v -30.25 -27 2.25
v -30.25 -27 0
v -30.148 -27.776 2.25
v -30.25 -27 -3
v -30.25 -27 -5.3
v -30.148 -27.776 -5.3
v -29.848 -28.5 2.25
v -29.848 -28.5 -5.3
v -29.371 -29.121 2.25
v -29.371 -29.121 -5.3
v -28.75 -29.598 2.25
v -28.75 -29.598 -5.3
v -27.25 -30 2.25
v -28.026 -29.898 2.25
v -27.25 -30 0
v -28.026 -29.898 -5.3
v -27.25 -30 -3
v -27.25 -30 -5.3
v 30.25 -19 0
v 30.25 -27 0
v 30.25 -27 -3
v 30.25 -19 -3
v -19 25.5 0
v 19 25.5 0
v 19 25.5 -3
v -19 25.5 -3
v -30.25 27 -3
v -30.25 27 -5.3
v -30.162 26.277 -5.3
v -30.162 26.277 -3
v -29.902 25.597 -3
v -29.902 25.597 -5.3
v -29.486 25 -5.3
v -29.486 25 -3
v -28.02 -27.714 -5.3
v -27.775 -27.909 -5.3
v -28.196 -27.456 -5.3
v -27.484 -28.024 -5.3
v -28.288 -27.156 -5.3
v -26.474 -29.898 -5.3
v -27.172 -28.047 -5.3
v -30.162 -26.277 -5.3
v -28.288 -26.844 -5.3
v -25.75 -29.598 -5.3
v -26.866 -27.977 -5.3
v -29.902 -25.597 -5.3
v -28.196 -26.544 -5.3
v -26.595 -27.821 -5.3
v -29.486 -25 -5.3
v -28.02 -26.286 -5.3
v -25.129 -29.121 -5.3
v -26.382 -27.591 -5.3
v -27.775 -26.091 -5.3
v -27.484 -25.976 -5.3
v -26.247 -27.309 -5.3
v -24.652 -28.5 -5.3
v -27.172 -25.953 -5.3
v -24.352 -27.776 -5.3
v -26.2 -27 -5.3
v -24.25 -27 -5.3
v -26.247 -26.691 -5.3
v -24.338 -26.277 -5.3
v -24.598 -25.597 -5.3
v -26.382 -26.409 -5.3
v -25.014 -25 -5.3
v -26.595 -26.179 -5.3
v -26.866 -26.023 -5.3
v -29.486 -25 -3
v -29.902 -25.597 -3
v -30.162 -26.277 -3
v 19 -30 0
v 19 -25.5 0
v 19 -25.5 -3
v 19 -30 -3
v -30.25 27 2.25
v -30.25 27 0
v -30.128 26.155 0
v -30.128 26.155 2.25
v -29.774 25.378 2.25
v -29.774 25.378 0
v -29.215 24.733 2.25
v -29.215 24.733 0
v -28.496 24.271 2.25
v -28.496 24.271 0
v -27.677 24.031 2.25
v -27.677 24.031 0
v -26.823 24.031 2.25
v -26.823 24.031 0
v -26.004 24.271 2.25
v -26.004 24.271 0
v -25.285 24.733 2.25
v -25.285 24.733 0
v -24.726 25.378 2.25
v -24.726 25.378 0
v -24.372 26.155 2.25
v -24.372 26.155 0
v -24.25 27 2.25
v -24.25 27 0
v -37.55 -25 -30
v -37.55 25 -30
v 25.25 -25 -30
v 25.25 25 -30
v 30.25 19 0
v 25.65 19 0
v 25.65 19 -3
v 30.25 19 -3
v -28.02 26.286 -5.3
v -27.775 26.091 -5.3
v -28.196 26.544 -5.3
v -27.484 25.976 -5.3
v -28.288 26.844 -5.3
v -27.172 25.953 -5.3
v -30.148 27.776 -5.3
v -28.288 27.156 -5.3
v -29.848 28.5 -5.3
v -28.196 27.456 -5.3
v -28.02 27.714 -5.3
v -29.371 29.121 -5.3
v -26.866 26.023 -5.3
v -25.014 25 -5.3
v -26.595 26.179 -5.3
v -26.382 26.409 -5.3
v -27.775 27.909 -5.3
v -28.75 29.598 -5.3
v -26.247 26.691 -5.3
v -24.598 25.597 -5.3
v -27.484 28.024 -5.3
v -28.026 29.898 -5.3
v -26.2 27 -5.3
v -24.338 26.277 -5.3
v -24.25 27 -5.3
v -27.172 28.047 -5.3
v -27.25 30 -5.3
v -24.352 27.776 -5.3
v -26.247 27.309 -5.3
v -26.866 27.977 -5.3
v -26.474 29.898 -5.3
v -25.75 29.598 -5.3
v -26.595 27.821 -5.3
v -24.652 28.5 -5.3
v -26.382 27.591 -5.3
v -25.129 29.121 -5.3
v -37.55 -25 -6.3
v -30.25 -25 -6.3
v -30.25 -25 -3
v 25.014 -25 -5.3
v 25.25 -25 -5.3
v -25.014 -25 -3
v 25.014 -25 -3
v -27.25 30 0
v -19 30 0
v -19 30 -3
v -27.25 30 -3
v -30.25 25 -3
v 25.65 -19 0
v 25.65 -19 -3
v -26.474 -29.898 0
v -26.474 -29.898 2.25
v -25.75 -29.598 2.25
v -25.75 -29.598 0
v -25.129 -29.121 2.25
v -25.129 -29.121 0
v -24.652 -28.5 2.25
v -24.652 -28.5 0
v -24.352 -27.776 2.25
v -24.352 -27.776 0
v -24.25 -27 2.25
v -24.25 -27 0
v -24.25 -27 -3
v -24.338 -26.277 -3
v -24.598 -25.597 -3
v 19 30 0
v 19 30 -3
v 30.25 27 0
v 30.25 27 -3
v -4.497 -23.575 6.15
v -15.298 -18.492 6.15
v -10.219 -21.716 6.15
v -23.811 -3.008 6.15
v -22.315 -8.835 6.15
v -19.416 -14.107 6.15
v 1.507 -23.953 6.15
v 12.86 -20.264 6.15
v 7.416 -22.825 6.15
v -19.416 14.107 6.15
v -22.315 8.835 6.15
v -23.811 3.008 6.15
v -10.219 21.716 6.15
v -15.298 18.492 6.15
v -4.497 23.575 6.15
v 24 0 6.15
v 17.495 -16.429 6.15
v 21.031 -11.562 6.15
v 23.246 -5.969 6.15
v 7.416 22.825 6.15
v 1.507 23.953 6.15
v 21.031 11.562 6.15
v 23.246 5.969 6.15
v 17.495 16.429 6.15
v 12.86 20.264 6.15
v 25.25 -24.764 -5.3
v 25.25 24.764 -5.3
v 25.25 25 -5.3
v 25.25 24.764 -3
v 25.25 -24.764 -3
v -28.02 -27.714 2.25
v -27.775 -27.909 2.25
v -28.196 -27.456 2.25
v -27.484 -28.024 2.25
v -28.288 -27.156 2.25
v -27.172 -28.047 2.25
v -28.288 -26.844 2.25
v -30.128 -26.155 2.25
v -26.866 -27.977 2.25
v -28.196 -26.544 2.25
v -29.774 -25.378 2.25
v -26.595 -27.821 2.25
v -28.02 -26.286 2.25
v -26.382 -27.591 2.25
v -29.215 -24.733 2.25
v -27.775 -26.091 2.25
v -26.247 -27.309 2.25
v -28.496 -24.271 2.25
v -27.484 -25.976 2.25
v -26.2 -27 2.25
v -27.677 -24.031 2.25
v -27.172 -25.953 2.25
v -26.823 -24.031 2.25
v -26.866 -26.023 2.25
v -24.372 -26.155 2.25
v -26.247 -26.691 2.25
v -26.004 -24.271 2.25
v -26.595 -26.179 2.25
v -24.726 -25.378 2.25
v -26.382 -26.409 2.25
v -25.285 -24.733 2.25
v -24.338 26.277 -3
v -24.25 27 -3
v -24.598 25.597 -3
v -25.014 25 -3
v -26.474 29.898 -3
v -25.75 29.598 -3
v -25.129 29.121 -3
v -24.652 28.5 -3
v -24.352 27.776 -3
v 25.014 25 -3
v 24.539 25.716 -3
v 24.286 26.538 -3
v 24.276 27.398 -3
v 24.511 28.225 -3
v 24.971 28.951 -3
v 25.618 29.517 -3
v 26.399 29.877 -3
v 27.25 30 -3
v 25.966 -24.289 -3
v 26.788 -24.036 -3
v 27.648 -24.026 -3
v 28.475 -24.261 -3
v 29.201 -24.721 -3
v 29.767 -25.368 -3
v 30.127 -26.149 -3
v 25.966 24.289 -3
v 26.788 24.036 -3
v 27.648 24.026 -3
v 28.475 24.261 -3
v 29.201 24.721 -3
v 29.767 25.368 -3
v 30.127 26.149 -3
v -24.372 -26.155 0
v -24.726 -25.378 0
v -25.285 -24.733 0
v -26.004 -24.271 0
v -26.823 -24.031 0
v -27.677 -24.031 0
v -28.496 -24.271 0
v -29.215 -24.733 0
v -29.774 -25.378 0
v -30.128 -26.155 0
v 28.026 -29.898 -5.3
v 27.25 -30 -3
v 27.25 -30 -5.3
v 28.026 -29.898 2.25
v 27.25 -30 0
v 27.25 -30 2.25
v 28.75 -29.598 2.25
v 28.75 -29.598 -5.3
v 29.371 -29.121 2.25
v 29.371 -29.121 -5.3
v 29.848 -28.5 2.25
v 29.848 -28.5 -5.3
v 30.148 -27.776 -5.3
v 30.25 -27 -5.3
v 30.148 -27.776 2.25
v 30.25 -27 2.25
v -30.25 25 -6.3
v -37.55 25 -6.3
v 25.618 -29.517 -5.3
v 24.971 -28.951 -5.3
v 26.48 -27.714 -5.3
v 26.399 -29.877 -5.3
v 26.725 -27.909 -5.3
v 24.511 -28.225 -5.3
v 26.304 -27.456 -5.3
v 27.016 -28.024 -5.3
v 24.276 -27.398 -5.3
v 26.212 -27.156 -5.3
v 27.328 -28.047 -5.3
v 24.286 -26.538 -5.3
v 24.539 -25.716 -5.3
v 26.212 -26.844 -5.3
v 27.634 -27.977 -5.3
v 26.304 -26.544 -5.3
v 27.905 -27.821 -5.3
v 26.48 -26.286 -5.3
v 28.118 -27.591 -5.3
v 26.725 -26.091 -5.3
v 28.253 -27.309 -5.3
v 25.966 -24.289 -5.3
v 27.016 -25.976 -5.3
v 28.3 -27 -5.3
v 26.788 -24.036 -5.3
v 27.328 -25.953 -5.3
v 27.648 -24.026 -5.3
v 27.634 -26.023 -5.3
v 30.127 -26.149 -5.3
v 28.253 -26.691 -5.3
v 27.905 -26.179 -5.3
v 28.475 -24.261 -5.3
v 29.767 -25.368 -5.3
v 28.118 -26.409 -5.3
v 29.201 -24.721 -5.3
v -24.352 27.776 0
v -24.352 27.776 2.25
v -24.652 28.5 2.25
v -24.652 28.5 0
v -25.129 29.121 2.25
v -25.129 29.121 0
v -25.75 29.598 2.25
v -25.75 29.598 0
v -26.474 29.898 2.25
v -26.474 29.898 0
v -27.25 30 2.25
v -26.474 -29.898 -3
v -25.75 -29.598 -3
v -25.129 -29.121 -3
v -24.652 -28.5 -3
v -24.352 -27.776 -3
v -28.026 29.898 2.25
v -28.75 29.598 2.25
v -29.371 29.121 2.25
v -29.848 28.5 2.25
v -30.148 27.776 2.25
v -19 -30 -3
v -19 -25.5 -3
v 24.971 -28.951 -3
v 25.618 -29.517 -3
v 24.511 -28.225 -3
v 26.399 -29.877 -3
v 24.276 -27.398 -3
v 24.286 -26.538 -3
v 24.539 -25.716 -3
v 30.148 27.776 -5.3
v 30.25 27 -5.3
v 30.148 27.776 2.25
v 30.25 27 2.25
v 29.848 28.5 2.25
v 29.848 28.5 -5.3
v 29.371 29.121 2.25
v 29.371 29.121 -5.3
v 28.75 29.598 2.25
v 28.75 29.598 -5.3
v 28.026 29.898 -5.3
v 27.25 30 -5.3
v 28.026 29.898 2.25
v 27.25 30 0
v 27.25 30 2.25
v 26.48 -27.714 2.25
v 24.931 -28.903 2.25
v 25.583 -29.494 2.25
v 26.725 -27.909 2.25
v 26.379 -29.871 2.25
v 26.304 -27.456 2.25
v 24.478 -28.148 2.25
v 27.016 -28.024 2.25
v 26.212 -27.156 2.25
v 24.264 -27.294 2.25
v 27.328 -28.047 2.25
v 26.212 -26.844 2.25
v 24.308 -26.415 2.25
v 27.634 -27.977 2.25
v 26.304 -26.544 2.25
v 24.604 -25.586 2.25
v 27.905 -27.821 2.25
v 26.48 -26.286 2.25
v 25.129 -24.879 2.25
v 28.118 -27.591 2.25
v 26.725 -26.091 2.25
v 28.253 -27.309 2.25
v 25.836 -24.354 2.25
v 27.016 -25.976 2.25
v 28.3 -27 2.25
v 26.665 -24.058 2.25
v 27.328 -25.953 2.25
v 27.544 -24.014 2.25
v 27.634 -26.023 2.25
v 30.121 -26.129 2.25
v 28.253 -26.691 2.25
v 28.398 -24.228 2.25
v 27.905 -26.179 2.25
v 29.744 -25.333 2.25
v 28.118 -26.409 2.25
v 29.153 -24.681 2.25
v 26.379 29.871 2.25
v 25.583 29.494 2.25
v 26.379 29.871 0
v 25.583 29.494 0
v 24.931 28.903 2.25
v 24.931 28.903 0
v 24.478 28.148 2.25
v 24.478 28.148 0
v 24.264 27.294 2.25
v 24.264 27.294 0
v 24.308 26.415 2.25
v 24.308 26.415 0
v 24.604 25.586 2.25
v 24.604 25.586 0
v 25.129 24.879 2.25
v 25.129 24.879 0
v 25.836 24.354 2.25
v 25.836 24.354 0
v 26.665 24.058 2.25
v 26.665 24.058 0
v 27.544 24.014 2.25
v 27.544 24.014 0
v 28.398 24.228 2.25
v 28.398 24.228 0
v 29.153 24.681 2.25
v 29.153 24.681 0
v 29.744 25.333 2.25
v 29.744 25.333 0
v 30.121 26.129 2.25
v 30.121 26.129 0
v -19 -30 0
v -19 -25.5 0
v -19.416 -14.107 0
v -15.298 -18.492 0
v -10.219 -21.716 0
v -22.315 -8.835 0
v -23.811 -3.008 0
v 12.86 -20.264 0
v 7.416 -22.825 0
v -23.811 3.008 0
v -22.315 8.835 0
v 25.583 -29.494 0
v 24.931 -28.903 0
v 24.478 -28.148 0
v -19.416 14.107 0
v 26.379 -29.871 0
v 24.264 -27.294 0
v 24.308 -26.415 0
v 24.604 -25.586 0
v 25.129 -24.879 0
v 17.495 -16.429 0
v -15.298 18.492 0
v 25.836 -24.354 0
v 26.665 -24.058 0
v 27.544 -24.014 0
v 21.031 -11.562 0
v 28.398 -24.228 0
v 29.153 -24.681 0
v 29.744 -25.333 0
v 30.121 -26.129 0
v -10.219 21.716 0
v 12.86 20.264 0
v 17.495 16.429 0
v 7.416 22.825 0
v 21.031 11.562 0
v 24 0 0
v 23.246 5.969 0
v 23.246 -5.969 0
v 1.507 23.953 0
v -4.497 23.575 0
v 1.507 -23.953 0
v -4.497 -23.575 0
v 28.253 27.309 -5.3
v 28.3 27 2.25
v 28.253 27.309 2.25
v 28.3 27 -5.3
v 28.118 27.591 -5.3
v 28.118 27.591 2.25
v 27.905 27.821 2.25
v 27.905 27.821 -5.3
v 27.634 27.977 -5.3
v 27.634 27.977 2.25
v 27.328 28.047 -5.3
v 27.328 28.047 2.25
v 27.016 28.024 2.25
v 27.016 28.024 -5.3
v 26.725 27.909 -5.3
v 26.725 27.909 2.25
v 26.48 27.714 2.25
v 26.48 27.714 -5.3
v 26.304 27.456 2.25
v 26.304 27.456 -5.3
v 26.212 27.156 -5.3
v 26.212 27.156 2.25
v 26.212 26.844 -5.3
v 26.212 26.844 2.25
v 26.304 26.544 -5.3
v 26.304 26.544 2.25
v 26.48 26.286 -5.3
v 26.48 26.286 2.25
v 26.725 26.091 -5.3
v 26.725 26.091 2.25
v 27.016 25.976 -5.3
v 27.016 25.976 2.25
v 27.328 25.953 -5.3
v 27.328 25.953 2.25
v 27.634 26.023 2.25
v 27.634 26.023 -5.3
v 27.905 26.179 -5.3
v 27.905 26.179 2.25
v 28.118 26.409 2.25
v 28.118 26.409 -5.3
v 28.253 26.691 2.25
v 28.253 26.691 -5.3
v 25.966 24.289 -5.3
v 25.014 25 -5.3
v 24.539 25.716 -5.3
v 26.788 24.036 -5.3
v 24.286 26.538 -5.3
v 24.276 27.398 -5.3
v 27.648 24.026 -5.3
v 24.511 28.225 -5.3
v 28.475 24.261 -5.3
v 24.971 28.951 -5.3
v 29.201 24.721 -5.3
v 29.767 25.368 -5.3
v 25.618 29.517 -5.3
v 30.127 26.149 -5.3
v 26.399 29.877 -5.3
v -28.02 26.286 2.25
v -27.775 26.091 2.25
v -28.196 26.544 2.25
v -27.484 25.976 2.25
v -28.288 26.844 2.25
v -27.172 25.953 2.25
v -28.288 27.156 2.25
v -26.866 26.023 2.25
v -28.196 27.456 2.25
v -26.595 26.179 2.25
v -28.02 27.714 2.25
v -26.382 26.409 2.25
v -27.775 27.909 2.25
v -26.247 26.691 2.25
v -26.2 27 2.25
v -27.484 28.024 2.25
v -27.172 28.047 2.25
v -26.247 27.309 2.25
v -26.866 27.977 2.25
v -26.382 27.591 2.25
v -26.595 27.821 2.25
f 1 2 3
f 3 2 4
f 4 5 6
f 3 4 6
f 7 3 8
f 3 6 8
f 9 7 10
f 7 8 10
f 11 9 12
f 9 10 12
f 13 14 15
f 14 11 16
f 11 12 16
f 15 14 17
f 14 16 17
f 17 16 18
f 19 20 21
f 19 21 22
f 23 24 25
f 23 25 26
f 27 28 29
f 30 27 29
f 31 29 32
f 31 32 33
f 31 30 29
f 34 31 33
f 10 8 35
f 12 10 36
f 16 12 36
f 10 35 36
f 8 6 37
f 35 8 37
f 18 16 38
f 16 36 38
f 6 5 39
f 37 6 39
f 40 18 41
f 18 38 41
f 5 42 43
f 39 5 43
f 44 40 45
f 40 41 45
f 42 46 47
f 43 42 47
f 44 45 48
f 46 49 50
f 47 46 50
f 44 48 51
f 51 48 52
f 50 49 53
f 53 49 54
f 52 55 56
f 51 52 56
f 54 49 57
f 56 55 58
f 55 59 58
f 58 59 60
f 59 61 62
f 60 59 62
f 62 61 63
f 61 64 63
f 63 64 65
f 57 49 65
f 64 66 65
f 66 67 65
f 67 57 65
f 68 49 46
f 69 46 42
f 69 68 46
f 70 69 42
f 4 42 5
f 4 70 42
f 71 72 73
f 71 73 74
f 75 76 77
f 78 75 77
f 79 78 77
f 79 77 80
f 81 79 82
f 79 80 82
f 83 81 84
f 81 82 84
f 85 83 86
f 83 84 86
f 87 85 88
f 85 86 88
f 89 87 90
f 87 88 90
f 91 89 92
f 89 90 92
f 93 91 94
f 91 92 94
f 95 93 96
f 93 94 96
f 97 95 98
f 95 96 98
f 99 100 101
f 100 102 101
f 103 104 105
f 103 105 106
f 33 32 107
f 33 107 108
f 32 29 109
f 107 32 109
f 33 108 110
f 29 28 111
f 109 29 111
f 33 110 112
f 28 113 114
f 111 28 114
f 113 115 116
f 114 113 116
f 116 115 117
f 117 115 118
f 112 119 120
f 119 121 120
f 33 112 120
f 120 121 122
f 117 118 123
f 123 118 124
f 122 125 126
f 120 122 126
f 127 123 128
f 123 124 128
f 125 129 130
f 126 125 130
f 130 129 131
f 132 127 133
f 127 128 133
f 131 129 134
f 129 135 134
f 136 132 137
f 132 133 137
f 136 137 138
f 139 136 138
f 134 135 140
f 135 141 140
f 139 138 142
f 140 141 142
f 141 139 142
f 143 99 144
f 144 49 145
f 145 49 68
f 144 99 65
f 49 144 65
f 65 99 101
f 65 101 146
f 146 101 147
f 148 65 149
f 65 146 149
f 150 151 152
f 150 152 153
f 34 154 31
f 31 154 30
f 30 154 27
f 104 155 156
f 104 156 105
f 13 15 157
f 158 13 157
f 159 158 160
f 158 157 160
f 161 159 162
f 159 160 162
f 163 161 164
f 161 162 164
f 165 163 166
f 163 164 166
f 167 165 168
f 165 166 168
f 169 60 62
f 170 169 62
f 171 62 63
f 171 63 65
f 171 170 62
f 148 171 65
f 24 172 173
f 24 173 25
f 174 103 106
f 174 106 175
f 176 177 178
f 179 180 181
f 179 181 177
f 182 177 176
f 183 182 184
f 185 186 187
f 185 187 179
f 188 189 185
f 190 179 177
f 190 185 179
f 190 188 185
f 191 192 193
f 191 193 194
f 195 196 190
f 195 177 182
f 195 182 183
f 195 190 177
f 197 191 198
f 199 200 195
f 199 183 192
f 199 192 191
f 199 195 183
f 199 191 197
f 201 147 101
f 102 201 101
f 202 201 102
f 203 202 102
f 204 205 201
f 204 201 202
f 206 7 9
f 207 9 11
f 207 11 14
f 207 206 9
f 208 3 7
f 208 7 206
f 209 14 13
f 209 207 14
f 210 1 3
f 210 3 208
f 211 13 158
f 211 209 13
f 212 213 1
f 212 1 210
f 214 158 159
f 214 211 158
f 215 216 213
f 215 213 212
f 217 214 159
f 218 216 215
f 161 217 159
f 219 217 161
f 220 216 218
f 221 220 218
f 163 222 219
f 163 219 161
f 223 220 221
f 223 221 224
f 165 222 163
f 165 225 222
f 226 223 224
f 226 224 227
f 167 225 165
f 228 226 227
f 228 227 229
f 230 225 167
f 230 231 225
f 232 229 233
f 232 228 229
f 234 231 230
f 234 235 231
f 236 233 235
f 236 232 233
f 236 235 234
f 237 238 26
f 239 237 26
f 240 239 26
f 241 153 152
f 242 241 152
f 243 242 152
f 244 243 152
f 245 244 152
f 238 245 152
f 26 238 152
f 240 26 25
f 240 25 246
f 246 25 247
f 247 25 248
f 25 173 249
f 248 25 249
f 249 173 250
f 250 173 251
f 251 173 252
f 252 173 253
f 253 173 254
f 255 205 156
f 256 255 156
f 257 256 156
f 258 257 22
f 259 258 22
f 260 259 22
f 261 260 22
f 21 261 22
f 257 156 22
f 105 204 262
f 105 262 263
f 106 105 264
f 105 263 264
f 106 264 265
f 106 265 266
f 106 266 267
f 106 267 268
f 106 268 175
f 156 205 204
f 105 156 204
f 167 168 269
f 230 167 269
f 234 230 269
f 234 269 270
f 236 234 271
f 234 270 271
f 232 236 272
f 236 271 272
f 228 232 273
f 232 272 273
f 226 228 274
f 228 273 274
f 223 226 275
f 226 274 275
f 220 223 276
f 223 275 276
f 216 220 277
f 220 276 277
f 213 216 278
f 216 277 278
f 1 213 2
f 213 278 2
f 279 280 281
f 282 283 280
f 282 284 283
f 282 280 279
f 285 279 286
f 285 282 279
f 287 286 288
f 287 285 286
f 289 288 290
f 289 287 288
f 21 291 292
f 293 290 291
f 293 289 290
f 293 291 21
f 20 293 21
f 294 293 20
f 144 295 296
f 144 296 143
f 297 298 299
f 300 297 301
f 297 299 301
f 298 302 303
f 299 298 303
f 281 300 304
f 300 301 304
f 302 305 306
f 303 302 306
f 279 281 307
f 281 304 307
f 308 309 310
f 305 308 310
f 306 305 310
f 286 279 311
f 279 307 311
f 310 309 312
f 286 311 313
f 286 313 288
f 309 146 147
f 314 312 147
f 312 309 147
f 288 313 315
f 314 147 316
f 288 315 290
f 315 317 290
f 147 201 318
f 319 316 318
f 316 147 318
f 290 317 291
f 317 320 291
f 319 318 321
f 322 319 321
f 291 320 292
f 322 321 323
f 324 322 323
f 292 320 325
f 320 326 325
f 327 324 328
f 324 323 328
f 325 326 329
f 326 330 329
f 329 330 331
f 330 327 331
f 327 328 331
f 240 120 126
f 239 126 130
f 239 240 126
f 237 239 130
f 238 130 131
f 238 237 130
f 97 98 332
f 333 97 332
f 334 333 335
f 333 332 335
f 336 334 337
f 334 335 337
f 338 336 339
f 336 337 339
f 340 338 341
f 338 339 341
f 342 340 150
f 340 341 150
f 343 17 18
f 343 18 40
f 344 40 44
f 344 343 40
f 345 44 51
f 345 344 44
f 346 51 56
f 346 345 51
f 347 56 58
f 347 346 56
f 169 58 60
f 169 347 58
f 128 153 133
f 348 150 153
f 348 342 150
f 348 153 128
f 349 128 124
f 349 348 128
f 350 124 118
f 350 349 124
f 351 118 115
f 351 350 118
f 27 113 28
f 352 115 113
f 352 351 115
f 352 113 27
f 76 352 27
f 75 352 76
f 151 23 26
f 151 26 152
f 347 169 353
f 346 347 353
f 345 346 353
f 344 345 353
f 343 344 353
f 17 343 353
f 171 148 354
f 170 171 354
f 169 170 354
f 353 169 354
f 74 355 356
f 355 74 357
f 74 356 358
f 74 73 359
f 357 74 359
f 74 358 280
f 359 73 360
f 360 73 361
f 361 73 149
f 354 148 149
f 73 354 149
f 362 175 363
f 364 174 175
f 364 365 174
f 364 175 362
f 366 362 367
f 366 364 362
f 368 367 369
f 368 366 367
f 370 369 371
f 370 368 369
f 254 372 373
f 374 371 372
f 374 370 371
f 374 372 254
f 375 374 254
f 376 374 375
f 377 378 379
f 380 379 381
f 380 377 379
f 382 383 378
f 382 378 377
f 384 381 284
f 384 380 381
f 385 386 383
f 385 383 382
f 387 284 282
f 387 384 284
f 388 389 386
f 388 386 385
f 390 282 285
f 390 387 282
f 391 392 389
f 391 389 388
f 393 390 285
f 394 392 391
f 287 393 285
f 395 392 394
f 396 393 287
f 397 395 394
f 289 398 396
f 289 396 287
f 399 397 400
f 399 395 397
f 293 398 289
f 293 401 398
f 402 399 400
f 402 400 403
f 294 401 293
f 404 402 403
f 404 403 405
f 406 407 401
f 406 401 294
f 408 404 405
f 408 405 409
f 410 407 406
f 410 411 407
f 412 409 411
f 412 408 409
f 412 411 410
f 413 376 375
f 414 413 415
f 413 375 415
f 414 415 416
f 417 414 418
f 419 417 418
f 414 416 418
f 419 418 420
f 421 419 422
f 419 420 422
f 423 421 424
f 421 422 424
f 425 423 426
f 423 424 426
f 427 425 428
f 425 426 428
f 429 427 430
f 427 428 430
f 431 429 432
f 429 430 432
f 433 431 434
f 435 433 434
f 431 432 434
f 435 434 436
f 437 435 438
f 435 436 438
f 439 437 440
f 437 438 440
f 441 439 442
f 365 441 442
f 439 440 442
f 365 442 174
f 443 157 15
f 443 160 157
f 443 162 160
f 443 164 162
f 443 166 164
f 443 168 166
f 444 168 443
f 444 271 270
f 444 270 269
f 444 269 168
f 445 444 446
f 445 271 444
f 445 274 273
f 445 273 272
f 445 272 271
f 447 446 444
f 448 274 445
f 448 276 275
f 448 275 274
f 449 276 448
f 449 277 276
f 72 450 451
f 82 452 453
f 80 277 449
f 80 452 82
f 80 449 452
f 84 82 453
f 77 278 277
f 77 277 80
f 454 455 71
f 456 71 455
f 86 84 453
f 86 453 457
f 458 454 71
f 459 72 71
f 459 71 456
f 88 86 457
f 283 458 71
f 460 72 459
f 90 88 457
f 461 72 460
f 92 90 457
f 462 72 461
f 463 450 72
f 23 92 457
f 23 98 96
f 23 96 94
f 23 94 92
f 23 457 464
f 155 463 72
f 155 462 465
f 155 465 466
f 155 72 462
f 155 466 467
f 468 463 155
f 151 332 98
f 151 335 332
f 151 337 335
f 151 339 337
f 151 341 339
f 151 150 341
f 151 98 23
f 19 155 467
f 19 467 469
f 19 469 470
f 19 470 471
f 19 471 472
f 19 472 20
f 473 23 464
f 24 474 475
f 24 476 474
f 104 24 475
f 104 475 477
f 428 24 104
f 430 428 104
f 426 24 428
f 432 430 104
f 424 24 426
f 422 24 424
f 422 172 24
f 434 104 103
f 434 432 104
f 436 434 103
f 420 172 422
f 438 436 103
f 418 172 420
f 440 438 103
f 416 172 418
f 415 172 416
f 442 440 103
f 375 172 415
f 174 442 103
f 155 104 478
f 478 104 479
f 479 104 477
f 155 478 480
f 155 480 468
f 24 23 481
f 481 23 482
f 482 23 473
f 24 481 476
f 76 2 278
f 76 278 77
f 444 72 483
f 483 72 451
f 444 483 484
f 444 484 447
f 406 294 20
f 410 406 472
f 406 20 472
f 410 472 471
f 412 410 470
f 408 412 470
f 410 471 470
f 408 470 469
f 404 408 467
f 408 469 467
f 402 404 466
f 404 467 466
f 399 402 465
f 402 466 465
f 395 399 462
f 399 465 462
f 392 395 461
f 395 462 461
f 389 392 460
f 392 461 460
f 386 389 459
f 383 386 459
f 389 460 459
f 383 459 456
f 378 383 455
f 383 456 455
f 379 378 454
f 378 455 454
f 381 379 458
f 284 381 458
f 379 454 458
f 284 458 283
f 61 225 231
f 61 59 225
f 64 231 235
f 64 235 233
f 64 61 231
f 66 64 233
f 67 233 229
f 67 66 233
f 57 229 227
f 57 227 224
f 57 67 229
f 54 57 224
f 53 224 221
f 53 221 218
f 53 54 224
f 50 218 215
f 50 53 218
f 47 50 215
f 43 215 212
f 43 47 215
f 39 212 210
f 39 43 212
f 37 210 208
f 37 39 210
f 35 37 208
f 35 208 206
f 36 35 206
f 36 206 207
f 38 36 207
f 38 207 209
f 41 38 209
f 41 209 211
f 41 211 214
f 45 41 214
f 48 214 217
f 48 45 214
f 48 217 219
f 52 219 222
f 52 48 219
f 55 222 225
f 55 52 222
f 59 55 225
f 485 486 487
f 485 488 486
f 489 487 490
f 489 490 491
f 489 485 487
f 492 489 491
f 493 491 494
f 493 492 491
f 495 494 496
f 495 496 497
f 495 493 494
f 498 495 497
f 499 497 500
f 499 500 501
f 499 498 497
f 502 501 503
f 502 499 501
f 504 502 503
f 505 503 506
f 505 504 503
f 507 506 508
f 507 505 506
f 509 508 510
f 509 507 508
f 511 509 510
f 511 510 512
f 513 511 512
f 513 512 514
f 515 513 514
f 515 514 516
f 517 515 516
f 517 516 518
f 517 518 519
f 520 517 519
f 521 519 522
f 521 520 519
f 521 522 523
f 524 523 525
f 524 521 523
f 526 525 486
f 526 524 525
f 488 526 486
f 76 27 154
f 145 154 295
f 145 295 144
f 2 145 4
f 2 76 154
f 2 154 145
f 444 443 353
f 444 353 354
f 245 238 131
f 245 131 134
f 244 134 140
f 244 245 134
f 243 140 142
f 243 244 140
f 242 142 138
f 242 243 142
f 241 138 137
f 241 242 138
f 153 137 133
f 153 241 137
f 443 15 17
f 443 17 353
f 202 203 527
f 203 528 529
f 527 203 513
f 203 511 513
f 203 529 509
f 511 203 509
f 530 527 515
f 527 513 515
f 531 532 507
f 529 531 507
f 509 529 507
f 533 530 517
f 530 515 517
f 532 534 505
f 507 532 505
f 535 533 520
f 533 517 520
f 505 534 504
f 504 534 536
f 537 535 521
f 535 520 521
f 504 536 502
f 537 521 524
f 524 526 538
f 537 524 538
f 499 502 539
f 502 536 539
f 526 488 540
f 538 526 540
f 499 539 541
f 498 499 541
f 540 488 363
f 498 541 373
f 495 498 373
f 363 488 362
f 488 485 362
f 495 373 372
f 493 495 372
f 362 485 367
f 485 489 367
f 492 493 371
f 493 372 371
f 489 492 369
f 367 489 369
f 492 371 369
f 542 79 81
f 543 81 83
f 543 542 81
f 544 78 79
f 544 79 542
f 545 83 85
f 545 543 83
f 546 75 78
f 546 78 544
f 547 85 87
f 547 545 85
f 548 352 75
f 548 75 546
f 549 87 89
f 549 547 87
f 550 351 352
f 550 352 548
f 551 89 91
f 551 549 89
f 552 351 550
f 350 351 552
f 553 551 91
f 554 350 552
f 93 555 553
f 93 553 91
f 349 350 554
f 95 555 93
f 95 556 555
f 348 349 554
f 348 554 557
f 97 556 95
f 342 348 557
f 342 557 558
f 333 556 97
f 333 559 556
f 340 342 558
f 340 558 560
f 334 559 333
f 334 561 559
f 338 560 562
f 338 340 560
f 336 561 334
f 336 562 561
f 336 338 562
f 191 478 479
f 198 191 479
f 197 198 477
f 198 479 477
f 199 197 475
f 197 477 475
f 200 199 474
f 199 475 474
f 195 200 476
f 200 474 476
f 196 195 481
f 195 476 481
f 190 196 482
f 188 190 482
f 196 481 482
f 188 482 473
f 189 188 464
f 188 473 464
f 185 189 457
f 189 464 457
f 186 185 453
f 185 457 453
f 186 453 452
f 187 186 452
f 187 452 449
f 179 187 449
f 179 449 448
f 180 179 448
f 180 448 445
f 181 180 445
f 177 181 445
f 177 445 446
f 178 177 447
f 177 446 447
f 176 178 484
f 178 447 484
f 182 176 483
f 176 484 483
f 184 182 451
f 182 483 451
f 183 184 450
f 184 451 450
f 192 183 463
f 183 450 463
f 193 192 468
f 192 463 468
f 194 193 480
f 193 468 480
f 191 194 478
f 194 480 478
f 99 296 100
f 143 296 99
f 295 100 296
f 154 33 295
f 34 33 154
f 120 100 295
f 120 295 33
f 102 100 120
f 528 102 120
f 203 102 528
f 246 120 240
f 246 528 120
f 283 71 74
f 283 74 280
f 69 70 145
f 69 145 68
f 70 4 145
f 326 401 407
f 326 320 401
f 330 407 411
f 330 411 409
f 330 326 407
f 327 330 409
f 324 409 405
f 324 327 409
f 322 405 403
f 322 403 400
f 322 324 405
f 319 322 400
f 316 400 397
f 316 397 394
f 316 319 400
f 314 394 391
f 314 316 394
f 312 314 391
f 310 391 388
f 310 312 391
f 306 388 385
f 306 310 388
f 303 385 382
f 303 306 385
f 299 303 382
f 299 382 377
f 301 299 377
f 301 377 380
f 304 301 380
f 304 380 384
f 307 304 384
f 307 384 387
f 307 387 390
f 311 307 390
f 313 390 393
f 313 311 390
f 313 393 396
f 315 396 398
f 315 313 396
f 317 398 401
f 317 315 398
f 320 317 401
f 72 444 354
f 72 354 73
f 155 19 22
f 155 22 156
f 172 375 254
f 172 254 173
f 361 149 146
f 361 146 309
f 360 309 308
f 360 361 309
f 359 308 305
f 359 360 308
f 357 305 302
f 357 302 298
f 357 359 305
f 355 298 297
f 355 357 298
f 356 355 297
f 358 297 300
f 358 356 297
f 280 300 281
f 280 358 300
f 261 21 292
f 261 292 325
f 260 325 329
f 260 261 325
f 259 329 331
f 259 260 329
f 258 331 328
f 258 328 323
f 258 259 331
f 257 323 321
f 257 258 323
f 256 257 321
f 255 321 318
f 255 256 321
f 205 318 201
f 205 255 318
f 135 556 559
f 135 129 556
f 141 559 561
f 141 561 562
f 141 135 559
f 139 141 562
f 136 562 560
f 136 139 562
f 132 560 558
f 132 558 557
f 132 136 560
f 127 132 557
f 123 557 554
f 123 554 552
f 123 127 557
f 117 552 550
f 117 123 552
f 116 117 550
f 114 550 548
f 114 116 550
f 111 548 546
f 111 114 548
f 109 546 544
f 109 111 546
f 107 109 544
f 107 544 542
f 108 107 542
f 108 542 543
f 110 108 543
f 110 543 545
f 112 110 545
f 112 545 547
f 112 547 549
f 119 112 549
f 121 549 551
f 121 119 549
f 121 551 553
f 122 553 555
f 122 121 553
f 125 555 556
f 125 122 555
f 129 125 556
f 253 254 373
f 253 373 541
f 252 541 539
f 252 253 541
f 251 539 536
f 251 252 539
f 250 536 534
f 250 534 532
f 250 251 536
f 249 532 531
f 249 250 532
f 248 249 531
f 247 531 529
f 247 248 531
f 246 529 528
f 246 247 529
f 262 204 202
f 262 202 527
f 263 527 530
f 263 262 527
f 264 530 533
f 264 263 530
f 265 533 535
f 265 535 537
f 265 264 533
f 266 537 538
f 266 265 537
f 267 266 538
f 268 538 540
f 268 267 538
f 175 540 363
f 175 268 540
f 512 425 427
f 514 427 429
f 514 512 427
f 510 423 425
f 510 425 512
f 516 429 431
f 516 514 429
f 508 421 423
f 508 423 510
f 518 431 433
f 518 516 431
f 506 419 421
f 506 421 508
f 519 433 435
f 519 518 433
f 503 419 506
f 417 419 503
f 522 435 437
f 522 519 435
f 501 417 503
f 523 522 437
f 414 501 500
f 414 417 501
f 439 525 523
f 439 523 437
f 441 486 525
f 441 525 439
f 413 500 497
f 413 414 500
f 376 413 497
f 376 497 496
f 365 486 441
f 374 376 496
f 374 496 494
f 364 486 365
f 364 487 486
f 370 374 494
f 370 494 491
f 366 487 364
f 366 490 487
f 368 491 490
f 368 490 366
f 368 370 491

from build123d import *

# Parameters (mm, degrees)
F0_R      = 24
F1_DEPTH  = 6.15
F0_R_2    = 1.05
F2_DEPTH  = 2.25
F3_DEPTH  = 5.3
F4_DEPTH  = 3
F6_W      = 55.5
F6_H      = 50
F7_DEPTH  = 30
F9_W      = 50
F9_H      = 23.7
F10_DEPTH = 7.3


with BuildPart() as f1:
    # F0 (on Top) → F1 (new body)
    with BuildSketch(Plane.XY):
        Circle(F0_R)
    extrude(amount=F1_DEPTH)


with BuildPart() as f2:
    # F0 (on Top) → F2 (new body)
    with BuildSketch(Plane.XY):
        with BuildLine():
            ThreePointArc((27.25, -30), (29.37132, -29.12132), (30.25, -27))
            ThreePointArc((30.25, -27), (25.12868, -24.87868), (27.25, -30))
        make_face()
        with Locations((27.25, -27)):
            Circle(F0_R_2, mode=Mode.SUBTRACT)
        with BuildLine():
            ThreePointArc((30.25, 27), (29.37132, 29.12132), (27.25, 30))
            ThreePointArc((27.25, 30), (25.12868, 24.87868), (30.25, 27))
        make_face()
        with Locations((27.25, 27)):
            Circle(F0_R_2, mode=Mode.SUBTRACT)
        with BuildLine():
            ThreePointArc((-24.25, 27), (-25.12868, 29.12132), (-27.25, 30))
            ThreePointArc((-27.25, 30), (-29.37132, 29.12132), (-30.25, 27))
            ThreePointArc((-30.25, 27), (-27.25, 24), (-24.25, 27))
        make_face()
        with Locations((-27.25, 27)):
            Circle(F0_R_2, mode=Mode.SUBTRACT)
        with BuildLine():
            ThreePointArc((-24.25, -27), (-27.25, -24), (-30.25, -27))
            ThreePointArc((-30.25, -27), (-29.37132, -29.12132), (-27.25, -30))
            ThreePointArc((-27.25, -30), (-25.12868, -29.12132), (-24.25, -27))
        make_face()
        with Locations((-27.25, -27)):
            Circle(F0_R_2, mode=Mode.SUBTRACT)
    extrude(amount=F2_DEPTH)


with BuildPart() as f3:
    # F0 (on Top) → F3 (new body)
    with BuildSketch(Plane.XY):
        with BuildLine():
            ThreePointArc((-24.25, -27), (-27.25, -24), (-30.25, -27))
            ThreePointArc((-30.25, -27), (-29.37132, -29.12132), (-27.25, -30))
            ThreePointArc((-27.25, -30), (-25.12868, -29.12132), (-24.25, -27))
        make_face()
        with Locations((-27.25, -27)):
            Circle(F0_R_2, mode=Mode.SUBTRACT)
        with BuildLine():
            ThreePointArc((-24.25, 27), (-25.12868, 29.12132), (-27.25, 30))
            ThreePointArc((-27.25, 30), (-29.37132, 29.12132), (-30.25, 27))
            ThreePointArc((-30.25, 27), (-27.25, 24), (-24.25, 27))
        make_face()
        with Locations((-27.25, 27)):
            Circle(F0_R_2, mode=Mode.SUBTRACT)
        with BuildLine():
            ThreePointArc((27.25, -30), (29.37132, -29.12132), (30.25, -27))
            ThreePointArc((30.25, -27), (25.12868, -24.87868), (27.25, -30))
        make_face()
        with Locations((27.25, -27)):
            Circle(F0_R_2, mode=Mode.SUBTRACT)
        with BuildLine():
            ThreePointArc((30.25, 27), (29.37132, 29.12132), (27.25, 30))
            ThreePointArc((27.25, 30), (25.12868, 24.87868), (30.25, 27))
        make_face()
        with Locations((27.25, 27)):
            Circle(F0_R_2, mode=Mode.SUBTRACT)
    extrude(amount=-F3_DEPTH)


with BuildPart() as f4:
    # F0 (on Top) → F4 (new body)
    with BuildSketch(Plane.XY):
        with BuildLine():
            ThreePointArc((30.25, 27), (25.12868, 24.87868), (27.25, 30))
            Line((27.25, 30), (19, 30))
            Line((19, 30), (19, 25.5))
            Line((19, 25.5), (-19, 25.5))
            Line((-19, 25.5), (-19, 30))
            Line((-19, 30), (-27.25, 30))
            ThreePointArc((-27.25, 30), (-25.12868, 29.12132), (-24.25, 27))
            ThreePointArc((-24.25, 27), (-27.25, 24), (-30.25, 27))
            Line((-30.25, 27), (-30.25, -27))
            ThreePointArc((-30.25, -27), (-27.25, -24), (-24.25, -27))
            ThreePointArc((-24.25, -27), (-25.12868, -29.12132), (-27.25, -30))
            Line((-27.25, -30), (-19, -30))
            Line((-19, -30), (-19, -25.5))
            Line((-19, -25.5), (19, -25.5))
            Line((19, -25.5), (19, -30))
            Line((19, -30), (27.25, -30))
            ThreePointArc((27.25, -30), (25.12868, -24.87868), (30.25, -27))
            Line((30.25, -27), (30.25, -19))
            Line((30.25, -19), (25.65, -19))
            Line((25.65, -19), (25.65, 19))
            Line((25.65, 19), (30.25, 19))
            Line((30.25, 19), (30.25, 27))
        make_face()
        Circle(F0_R, mode=Mode.SUBTRACT)
    extrude(amount=-F4_DEPTH)

    # F5: union F3, F2, F1
    add(f3.part)
    add(f2.part)
    add(f1.part)


with BuildPart() as f7:
    # F6 (on face) → F7 (new body)
    with BuildSketch(Plane.XY):
        with Locations((-2.5, 0)):
            Rectangle(F6_W, F6_H)
    extrude(amount=-F7_DEPTH)


with BuildPart() as f4_1:
    add(f4.part)

    # F8: union F7
    add(f7.part)

    # F9 (on face) → F10 (join)
    with BuildSketch(Plane(origin=(-30.25, 0, 0), x_dir=(0, -1, 0), z_dir=(-1, 0, 0))):
        with Locations((0, -18.15)):
            Rectangle(F9_W, F9_H)
    extrude(amount=F10_DEPTH)


solid = f4_1.part
